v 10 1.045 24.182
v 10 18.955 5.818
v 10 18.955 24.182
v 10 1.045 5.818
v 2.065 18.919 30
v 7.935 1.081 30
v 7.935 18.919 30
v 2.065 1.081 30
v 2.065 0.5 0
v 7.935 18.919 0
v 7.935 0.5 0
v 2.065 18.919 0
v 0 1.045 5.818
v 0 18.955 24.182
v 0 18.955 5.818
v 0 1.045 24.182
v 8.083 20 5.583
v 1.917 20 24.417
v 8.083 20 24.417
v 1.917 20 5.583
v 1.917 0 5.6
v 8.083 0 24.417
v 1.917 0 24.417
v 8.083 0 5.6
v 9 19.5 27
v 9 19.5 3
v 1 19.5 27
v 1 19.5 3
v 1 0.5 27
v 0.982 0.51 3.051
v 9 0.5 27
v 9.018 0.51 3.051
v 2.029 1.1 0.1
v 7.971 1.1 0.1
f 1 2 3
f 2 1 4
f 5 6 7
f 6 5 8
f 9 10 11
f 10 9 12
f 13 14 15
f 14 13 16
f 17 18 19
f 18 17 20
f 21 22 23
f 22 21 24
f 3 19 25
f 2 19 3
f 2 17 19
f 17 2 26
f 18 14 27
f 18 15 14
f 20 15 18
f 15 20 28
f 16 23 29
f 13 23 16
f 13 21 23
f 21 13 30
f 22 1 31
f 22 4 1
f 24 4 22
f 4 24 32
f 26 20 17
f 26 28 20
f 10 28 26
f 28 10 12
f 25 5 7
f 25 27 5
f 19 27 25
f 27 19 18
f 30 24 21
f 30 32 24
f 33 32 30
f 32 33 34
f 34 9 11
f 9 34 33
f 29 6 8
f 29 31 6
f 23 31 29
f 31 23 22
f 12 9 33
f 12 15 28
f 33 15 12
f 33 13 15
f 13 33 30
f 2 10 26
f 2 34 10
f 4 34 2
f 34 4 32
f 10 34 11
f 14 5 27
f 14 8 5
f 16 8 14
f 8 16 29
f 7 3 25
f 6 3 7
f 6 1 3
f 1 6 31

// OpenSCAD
module beveledcube(x=10, y=10, z=10, bx=2, by=2, bz=2) {
   f = 0.1;
    difference() {
        cube([x, y, z]);
        translate([0,0,-f]) linear_extrude(height=z+2*f) {
            polygon([[-f,-f],[bx+f,-f],[-f,by+f]]);
            polygon([[x-bx-f,-f],[x+f,-f],[x+f,by+f]]);
            polygon([[x-bx-f,y+f],[x+f,y+f],[x+f,y-by-f]]);
            polygon([[-f,y+f],[bx+f,y+f],[-f,y-by-f]]);
        }
        rotate([0,90,0]) translate([0,0,-f]) linear_extrude(height=x+2*f) {
            polygon([[f,-f],[-bz-f,-f],[-f,by+f]]);
            polygon([[-z-f,-f],[-z-f,by+f],[-z+bz+f,-f]]);
            polygon([[f,y+f],[-bz-f,y+f],[f,y-by-f]]);
            polygon([[-z-f,y+f],[-z-f,y-by-f],[-z+bz+f,y+f]]);
        }
        rotate([-90,0,0]) translate([0,0,-f]) linear_extrude(height=y+2*f) {
            polygon([[-f,f],[bx+f,f],[-f,-bz-f]]);
            polygon([[x-bx-f,f],[x+f,f],[x+f,-bz-f]]);
            polygon([[-f,-z-f],[bx+f,-z-f],[-f,-z+bz+f]]);
            polygon([[x-bx-f,-z-f],[x+f,-z-f],[x+f,-z+bz+f]]);
        }
    }

}
beveledcube(y=20,z=30,by=1,bz=6);
